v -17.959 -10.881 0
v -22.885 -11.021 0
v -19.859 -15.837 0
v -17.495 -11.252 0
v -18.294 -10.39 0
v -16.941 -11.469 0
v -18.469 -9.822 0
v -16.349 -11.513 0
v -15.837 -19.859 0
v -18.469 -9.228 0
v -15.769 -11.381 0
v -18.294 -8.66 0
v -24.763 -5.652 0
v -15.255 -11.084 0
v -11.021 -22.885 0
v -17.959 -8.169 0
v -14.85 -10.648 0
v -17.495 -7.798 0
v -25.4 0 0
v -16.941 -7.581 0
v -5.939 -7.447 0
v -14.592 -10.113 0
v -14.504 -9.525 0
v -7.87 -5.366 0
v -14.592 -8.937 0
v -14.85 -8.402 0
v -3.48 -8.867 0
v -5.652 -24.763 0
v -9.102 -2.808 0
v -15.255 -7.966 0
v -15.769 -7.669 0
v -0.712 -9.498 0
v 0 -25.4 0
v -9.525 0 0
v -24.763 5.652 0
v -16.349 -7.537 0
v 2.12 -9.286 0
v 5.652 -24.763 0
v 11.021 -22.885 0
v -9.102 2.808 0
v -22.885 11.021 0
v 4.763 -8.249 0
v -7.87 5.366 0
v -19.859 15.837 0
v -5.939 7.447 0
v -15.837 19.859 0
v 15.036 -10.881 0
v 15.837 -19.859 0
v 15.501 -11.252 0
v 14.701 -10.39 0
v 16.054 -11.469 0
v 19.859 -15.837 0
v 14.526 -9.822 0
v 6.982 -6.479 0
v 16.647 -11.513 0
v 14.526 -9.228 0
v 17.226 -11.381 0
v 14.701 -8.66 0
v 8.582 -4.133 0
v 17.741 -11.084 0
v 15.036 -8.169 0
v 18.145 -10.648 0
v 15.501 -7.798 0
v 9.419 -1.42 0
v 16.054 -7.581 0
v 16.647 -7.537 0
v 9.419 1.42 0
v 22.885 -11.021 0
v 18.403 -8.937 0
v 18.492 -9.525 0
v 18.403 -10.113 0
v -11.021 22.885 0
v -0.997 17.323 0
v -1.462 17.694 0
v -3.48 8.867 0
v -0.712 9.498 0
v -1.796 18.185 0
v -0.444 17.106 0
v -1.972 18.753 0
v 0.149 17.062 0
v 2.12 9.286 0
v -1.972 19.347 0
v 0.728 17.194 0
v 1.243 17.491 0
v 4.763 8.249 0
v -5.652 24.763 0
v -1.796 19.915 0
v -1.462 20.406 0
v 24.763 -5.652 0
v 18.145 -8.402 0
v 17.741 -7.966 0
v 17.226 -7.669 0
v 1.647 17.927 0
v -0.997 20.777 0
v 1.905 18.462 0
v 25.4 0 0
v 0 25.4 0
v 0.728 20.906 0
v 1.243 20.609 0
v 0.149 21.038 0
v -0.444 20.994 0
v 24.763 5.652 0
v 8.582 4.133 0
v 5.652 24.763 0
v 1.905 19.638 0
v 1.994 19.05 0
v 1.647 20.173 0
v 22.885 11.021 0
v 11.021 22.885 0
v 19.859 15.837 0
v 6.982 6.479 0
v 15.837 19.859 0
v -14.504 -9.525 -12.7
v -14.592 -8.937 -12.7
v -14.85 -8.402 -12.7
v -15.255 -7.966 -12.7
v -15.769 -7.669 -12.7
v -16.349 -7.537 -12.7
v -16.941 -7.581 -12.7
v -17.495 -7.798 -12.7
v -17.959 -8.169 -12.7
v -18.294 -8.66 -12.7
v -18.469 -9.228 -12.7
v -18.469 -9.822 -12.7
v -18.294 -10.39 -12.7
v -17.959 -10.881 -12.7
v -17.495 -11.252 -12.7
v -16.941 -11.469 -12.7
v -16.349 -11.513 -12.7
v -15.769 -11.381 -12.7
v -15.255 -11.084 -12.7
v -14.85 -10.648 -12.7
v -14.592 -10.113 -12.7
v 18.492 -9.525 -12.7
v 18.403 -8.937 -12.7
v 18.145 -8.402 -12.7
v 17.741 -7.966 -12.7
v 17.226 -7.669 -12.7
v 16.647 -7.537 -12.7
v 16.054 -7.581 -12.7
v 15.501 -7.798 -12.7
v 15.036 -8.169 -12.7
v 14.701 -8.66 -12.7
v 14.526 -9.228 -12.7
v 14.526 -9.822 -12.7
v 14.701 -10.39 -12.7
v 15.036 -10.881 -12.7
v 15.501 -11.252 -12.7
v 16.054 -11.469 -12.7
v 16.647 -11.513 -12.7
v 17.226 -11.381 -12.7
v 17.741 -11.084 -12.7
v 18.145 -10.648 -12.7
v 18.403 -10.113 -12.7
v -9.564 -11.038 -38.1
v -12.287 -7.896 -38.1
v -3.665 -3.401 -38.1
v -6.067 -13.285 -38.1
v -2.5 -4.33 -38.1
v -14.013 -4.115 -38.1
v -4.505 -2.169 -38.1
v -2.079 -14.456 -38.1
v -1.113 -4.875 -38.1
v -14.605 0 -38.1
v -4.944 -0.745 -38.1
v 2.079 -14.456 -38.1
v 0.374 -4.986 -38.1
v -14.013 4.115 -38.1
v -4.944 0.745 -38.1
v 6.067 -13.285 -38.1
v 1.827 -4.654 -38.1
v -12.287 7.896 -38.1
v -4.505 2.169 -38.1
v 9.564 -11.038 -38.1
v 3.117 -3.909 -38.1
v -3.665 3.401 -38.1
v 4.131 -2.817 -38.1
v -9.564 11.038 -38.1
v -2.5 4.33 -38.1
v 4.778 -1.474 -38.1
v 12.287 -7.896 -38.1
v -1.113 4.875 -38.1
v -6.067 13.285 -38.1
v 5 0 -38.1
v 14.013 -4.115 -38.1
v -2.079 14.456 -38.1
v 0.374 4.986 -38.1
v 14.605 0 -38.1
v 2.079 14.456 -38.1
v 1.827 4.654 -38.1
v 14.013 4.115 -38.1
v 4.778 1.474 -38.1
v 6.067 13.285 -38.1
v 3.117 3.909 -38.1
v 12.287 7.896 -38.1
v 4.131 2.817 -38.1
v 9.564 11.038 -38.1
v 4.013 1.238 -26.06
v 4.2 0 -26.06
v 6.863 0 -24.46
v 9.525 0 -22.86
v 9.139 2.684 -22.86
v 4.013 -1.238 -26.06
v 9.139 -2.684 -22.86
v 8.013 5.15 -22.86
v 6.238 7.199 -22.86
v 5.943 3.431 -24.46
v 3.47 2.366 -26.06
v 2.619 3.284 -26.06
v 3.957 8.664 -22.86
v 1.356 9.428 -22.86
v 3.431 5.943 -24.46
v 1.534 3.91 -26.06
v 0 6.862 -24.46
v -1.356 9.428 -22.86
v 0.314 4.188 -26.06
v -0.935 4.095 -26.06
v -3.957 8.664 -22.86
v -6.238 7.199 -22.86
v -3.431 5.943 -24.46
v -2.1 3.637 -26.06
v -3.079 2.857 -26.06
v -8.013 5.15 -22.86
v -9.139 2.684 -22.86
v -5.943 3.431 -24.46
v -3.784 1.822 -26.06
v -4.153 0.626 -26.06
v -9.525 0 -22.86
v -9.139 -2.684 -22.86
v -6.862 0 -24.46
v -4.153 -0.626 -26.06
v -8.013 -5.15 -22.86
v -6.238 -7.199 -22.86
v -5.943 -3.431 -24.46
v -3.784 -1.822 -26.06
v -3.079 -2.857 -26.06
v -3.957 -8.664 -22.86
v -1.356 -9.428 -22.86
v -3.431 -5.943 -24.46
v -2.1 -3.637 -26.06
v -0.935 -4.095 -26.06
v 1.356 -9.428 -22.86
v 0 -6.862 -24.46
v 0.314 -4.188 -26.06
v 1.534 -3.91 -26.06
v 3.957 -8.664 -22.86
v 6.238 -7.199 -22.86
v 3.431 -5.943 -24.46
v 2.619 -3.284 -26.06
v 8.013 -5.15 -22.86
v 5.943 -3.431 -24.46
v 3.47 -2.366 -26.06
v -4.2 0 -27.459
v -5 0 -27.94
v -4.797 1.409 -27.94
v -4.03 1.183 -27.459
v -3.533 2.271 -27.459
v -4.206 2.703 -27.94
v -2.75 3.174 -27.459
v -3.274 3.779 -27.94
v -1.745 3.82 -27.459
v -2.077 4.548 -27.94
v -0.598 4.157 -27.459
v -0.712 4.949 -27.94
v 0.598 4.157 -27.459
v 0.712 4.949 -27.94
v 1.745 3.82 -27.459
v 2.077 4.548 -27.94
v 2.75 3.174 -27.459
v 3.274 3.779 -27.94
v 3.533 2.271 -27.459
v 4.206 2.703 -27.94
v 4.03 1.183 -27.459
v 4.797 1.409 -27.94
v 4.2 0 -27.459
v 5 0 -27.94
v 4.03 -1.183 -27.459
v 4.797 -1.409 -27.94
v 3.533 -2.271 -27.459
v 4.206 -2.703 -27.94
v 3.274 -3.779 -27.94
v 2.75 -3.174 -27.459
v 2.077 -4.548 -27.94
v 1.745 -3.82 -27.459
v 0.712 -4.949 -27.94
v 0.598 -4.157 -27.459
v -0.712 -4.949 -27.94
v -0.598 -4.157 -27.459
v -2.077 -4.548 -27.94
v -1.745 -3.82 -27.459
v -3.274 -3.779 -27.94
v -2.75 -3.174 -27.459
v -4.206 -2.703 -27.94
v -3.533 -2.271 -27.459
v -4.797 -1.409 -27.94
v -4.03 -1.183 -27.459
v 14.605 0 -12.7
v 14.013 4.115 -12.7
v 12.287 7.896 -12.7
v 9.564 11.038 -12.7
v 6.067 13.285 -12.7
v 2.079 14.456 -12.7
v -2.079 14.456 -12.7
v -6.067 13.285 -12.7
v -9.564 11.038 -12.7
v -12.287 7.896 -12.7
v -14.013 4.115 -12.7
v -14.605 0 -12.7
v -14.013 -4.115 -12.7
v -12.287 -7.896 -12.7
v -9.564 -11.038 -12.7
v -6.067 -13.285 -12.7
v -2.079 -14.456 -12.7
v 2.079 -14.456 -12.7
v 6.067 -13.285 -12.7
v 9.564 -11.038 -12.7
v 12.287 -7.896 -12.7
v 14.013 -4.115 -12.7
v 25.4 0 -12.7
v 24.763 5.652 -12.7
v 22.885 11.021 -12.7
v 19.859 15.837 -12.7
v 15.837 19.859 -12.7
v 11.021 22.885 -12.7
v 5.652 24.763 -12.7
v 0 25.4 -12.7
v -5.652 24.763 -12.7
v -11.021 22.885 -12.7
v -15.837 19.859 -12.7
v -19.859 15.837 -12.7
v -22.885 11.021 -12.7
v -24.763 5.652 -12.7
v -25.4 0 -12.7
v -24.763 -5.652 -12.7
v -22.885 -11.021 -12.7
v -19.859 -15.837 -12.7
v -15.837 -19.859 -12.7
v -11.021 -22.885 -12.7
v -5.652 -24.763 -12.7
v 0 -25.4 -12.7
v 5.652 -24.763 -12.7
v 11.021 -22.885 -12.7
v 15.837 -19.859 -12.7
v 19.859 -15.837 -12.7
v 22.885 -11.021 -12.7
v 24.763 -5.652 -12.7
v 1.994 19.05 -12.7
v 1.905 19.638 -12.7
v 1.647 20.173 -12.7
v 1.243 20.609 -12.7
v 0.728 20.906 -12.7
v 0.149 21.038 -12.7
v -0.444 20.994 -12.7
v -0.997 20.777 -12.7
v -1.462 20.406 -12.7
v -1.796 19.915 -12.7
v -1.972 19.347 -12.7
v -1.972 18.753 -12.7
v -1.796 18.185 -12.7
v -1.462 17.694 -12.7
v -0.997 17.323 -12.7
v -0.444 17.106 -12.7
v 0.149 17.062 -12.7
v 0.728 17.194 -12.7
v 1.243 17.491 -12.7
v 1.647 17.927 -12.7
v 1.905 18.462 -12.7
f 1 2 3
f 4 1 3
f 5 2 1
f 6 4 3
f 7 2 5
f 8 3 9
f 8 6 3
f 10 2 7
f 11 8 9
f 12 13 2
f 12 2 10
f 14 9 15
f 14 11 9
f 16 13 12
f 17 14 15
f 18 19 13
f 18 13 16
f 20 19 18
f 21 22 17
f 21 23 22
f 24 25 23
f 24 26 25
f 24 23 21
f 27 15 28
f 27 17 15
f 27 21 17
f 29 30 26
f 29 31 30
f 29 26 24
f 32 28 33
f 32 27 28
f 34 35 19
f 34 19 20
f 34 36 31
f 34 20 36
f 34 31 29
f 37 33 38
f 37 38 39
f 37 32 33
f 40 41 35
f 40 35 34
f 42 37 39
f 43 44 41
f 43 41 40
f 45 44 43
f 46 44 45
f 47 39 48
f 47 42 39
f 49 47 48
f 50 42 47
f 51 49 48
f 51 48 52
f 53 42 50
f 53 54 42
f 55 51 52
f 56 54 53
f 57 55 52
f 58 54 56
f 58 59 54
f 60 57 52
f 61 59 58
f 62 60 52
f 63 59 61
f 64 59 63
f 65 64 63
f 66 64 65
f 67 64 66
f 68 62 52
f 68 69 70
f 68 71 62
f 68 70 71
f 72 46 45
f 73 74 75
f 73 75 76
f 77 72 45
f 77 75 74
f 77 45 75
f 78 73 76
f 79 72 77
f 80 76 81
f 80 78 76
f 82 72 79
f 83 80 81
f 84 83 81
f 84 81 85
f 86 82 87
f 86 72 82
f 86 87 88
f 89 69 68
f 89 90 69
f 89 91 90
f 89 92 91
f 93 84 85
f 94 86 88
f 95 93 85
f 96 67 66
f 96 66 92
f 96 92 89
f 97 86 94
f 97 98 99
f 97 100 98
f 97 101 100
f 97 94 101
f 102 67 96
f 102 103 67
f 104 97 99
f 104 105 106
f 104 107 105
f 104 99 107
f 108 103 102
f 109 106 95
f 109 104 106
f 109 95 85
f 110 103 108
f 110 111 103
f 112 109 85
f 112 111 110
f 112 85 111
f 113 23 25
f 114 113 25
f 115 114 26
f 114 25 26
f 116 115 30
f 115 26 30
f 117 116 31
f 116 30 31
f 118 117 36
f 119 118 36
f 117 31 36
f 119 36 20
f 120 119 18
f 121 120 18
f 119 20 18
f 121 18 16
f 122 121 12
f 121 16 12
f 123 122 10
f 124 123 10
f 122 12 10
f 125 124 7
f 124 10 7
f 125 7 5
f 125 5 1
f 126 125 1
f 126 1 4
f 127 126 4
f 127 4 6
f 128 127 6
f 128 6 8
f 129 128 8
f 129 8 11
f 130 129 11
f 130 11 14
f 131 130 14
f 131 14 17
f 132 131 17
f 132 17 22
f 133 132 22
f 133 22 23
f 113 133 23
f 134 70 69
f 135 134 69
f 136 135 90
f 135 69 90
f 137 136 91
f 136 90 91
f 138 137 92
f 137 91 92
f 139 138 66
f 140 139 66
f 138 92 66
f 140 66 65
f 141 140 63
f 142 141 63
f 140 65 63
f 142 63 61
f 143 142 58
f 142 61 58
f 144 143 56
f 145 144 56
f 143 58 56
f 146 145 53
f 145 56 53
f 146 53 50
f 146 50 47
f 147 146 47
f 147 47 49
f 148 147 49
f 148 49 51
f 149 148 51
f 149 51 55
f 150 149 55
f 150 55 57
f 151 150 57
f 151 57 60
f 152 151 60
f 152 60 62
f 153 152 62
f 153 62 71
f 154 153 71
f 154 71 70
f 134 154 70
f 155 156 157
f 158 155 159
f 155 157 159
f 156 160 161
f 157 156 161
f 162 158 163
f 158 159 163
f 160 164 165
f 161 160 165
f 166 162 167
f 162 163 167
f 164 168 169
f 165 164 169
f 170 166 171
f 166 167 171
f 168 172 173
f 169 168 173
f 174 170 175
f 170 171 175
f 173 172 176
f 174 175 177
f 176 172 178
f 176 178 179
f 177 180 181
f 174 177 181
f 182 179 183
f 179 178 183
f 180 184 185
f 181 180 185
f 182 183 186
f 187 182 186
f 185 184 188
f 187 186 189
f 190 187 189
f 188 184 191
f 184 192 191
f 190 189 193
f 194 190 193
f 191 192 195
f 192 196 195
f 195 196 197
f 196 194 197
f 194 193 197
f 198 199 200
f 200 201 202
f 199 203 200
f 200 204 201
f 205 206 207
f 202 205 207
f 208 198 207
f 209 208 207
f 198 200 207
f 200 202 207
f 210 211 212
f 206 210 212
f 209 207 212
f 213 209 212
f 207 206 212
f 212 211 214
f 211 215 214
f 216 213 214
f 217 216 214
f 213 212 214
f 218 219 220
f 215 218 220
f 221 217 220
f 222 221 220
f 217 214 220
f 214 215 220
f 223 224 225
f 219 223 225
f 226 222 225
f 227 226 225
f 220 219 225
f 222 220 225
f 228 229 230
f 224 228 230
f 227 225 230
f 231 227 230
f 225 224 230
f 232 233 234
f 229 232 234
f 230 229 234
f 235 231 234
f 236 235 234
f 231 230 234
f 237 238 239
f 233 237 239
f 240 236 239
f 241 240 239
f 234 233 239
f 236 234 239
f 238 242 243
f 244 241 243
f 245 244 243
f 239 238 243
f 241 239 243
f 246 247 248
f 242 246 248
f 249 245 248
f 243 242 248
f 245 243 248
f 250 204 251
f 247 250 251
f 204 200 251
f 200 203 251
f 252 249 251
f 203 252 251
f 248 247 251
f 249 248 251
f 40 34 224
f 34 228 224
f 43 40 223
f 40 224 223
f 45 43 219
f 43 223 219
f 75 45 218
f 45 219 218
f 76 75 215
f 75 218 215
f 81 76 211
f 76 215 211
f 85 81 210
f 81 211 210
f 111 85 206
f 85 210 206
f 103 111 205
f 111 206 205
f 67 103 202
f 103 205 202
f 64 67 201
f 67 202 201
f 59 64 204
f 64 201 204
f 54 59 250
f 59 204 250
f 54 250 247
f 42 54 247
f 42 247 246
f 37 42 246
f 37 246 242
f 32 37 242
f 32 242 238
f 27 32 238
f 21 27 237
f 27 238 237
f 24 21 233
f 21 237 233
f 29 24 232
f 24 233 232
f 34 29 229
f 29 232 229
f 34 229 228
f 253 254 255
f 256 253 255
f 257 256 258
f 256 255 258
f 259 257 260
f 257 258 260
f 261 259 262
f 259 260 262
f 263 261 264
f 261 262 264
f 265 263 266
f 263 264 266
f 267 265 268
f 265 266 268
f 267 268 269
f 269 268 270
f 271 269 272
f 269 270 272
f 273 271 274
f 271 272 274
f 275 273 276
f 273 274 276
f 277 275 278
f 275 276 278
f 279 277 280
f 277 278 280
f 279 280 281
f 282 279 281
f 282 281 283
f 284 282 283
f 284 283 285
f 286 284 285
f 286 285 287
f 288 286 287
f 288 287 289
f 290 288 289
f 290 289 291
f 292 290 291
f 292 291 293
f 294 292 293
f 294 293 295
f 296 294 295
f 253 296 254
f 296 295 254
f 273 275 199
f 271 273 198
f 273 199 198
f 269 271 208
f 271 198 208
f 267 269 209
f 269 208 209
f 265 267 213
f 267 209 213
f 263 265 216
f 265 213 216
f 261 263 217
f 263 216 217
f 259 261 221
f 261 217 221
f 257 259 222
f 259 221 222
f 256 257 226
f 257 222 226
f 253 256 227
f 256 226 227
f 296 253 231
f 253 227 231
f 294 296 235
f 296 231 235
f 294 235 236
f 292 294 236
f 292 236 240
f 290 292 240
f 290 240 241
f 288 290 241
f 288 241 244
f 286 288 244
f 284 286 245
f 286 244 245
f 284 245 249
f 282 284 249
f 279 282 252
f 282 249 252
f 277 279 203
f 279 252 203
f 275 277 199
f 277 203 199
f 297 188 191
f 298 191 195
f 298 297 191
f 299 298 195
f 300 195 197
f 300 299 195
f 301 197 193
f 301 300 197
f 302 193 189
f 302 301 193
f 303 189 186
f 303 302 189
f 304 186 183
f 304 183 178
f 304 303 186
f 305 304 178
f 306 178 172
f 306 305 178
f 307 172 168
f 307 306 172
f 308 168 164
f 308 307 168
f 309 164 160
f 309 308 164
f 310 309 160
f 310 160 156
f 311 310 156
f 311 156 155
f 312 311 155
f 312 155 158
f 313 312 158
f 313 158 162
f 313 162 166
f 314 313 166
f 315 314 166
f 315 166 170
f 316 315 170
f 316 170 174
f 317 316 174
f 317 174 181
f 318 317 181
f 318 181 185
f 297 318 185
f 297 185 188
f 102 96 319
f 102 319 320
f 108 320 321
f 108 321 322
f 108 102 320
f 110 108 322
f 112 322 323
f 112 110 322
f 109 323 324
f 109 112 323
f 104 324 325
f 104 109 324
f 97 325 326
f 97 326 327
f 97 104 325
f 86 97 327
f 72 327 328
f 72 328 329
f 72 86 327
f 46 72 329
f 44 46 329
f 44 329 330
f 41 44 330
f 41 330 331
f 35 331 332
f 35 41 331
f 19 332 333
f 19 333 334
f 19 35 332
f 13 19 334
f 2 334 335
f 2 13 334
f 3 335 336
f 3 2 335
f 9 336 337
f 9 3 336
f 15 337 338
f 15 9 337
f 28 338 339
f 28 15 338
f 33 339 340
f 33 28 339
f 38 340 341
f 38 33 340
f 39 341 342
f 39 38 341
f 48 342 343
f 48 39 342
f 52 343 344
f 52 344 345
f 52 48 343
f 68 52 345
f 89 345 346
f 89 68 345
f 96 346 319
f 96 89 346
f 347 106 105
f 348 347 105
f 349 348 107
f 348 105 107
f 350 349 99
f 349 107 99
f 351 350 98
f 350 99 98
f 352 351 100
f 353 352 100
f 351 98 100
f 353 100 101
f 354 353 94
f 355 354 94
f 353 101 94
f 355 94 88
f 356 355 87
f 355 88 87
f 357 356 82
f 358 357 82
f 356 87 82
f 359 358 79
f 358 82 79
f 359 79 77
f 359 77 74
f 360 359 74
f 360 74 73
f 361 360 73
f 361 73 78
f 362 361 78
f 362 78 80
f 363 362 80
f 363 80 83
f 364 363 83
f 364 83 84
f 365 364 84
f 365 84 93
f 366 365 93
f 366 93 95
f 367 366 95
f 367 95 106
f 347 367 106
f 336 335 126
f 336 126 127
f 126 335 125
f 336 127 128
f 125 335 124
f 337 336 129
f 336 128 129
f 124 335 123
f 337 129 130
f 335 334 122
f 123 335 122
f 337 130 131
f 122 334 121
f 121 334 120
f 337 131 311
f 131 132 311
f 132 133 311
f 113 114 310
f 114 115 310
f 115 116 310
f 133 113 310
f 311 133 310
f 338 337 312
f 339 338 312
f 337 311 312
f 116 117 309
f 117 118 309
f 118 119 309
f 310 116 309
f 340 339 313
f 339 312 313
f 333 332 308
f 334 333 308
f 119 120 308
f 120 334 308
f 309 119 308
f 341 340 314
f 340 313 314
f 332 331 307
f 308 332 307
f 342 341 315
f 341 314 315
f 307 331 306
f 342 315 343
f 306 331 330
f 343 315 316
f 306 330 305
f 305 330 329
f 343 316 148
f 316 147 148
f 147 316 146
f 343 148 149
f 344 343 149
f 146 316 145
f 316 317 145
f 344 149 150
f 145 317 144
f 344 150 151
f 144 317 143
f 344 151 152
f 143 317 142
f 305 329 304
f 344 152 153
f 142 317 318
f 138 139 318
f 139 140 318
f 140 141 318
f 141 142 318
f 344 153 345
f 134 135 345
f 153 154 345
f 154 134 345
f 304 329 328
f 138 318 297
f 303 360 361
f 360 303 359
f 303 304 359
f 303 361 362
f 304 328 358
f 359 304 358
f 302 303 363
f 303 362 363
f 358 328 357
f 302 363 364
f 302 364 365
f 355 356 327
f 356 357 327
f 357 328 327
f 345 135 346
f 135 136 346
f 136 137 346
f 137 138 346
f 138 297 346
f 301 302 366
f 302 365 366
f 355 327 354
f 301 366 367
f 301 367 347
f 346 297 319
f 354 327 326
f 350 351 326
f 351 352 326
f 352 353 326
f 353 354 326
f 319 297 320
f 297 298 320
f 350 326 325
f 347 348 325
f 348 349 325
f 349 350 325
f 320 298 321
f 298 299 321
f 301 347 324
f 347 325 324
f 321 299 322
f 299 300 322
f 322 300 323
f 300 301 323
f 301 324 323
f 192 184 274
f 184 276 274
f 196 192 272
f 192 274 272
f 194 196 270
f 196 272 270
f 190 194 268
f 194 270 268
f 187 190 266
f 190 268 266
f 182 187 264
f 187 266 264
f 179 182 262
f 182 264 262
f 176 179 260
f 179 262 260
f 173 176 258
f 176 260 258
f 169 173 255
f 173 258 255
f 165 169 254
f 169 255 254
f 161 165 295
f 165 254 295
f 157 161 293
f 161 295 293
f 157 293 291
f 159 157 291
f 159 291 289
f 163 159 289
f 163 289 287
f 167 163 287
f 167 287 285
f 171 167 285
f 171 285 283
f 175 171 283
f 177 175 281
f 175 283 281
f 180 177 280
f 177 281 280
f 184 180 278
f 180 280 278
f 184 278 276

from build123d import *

# Parameters (mm, degrees)
SKETCH1_R                       = 25.4
BOSS_EXTRUDE1_DEPTH             = 12.7
SKETCH9_R                       = 14.605
BOSS_EXTRUDE2_DEPTH             = 38.1
F_10_24_TAPPED_HOLE1_D          = 3.9878
F_8_4_8_4_DIAMETER_HOLE2_D      = 8.4
F_10_0_10_DIAMETER_HOLE1_D      = 10
F_10_0_10_DIAMETER_HOLE1_DEPTH  = 10.16
F_10_0_10_DIAMETER_HOLE1_TIP    = 3.004303095
F_3_4_0_75_DIAMETER_HOLE1_D     = 19.05
F_3_4_0_75_DIAMETER_HOLE1_DEPTH = 22.86
F_3_4_0_75_DIAMETER_HOLE1_TIP   = 5.723197396


with BuildPart() as part:
    # Sketch1 → Boss-Extrude1 (new body)
    with BuildSketch(Plane.XY):
        Circle(SKETCH1_R)
    extrude(amount=-BOSS_EXTRUDE1_DEPTH)

    # Sketch9 → Boss-Extrude2 (add)
    with BuildSketch(Plane.XY):
        Circle(SKETCH9_R)
    extrude(amount=-BOSS_EXTRUDE2_DEPTH)

    # #10-24 Tapped Hole1 (through all)
    with Locations(Plane(origin=(0, 0, -12.7), x_dir=(-1, 0, 0), z_dir=(0, 0, -1))):
        with Locations((0, 19.05), (-16.497783942, -9.525), (16.497783942, -9.525)):
            Hole(F_10_24_TAPPED_HOLE1_D / 2)

    # Ø8.4 (8.4) Diameter Hole2 (through all)
    with Locations(Plane(origin=(0, 0, -38.1), x_dir=(-1, 0, 0), z_dir=(0, 0, -1))):
        with Locations((0, 0)):
            Hole(F_8_4_8_4_DIAMETER_HOLE2_D / 2)

    # Ø10.0 (10) Diameter Hole1
    with Locations(Plane(origin=(0, 0, -38.1), x_dir=(-1, 0, 0), z_dir=(0, 0, -1))):
        with Locations((0, 0)):
            Hole(F_10_0_10_DIAMETER_HOLE1_D / 2, depth=F_10_0_10_DIAMETER_HOLE1_DEPTH)
            with Locations((0, 0, -(F_10_0_10_DIAMETER_HOLE1_DEPTH + F_10_0_10_DIAMETER_HOLE1_TIP / 2))):  # 118° drill point
                Cone(0, F_10_0_10_DIAMETER_HOLE1_D / 2, F_10_0_10_DIAMETER_HOLE1_TIP, mode=Mode.SUBTRACT)

    # 3/4 (0.75) Diameter Hole1
    with Locations(Plane.XY):
        with Locations((0, 0)):
            Hole(F_3_4_0_75_DIAMETER_HOLE1_D / 2, depth=F_3_4_0_75_DIAMETER_HOLE1_DEPTH)
            with Locations((0, 0, -(F_3_4_0_75_DIAMETER_HOLE1_DEPTH + F_3_4_0_75_DIAMETER_HOLE1_TIP / 2))):  # 118° drill point
                Cone(0, F_3_4_0_75_DIAMETER_HOLE1_D / 2, F_3_4_0_75_DIAMETER_HOLE1_TIP, mode=Mode.SUBTRACT)


solid = part.part
